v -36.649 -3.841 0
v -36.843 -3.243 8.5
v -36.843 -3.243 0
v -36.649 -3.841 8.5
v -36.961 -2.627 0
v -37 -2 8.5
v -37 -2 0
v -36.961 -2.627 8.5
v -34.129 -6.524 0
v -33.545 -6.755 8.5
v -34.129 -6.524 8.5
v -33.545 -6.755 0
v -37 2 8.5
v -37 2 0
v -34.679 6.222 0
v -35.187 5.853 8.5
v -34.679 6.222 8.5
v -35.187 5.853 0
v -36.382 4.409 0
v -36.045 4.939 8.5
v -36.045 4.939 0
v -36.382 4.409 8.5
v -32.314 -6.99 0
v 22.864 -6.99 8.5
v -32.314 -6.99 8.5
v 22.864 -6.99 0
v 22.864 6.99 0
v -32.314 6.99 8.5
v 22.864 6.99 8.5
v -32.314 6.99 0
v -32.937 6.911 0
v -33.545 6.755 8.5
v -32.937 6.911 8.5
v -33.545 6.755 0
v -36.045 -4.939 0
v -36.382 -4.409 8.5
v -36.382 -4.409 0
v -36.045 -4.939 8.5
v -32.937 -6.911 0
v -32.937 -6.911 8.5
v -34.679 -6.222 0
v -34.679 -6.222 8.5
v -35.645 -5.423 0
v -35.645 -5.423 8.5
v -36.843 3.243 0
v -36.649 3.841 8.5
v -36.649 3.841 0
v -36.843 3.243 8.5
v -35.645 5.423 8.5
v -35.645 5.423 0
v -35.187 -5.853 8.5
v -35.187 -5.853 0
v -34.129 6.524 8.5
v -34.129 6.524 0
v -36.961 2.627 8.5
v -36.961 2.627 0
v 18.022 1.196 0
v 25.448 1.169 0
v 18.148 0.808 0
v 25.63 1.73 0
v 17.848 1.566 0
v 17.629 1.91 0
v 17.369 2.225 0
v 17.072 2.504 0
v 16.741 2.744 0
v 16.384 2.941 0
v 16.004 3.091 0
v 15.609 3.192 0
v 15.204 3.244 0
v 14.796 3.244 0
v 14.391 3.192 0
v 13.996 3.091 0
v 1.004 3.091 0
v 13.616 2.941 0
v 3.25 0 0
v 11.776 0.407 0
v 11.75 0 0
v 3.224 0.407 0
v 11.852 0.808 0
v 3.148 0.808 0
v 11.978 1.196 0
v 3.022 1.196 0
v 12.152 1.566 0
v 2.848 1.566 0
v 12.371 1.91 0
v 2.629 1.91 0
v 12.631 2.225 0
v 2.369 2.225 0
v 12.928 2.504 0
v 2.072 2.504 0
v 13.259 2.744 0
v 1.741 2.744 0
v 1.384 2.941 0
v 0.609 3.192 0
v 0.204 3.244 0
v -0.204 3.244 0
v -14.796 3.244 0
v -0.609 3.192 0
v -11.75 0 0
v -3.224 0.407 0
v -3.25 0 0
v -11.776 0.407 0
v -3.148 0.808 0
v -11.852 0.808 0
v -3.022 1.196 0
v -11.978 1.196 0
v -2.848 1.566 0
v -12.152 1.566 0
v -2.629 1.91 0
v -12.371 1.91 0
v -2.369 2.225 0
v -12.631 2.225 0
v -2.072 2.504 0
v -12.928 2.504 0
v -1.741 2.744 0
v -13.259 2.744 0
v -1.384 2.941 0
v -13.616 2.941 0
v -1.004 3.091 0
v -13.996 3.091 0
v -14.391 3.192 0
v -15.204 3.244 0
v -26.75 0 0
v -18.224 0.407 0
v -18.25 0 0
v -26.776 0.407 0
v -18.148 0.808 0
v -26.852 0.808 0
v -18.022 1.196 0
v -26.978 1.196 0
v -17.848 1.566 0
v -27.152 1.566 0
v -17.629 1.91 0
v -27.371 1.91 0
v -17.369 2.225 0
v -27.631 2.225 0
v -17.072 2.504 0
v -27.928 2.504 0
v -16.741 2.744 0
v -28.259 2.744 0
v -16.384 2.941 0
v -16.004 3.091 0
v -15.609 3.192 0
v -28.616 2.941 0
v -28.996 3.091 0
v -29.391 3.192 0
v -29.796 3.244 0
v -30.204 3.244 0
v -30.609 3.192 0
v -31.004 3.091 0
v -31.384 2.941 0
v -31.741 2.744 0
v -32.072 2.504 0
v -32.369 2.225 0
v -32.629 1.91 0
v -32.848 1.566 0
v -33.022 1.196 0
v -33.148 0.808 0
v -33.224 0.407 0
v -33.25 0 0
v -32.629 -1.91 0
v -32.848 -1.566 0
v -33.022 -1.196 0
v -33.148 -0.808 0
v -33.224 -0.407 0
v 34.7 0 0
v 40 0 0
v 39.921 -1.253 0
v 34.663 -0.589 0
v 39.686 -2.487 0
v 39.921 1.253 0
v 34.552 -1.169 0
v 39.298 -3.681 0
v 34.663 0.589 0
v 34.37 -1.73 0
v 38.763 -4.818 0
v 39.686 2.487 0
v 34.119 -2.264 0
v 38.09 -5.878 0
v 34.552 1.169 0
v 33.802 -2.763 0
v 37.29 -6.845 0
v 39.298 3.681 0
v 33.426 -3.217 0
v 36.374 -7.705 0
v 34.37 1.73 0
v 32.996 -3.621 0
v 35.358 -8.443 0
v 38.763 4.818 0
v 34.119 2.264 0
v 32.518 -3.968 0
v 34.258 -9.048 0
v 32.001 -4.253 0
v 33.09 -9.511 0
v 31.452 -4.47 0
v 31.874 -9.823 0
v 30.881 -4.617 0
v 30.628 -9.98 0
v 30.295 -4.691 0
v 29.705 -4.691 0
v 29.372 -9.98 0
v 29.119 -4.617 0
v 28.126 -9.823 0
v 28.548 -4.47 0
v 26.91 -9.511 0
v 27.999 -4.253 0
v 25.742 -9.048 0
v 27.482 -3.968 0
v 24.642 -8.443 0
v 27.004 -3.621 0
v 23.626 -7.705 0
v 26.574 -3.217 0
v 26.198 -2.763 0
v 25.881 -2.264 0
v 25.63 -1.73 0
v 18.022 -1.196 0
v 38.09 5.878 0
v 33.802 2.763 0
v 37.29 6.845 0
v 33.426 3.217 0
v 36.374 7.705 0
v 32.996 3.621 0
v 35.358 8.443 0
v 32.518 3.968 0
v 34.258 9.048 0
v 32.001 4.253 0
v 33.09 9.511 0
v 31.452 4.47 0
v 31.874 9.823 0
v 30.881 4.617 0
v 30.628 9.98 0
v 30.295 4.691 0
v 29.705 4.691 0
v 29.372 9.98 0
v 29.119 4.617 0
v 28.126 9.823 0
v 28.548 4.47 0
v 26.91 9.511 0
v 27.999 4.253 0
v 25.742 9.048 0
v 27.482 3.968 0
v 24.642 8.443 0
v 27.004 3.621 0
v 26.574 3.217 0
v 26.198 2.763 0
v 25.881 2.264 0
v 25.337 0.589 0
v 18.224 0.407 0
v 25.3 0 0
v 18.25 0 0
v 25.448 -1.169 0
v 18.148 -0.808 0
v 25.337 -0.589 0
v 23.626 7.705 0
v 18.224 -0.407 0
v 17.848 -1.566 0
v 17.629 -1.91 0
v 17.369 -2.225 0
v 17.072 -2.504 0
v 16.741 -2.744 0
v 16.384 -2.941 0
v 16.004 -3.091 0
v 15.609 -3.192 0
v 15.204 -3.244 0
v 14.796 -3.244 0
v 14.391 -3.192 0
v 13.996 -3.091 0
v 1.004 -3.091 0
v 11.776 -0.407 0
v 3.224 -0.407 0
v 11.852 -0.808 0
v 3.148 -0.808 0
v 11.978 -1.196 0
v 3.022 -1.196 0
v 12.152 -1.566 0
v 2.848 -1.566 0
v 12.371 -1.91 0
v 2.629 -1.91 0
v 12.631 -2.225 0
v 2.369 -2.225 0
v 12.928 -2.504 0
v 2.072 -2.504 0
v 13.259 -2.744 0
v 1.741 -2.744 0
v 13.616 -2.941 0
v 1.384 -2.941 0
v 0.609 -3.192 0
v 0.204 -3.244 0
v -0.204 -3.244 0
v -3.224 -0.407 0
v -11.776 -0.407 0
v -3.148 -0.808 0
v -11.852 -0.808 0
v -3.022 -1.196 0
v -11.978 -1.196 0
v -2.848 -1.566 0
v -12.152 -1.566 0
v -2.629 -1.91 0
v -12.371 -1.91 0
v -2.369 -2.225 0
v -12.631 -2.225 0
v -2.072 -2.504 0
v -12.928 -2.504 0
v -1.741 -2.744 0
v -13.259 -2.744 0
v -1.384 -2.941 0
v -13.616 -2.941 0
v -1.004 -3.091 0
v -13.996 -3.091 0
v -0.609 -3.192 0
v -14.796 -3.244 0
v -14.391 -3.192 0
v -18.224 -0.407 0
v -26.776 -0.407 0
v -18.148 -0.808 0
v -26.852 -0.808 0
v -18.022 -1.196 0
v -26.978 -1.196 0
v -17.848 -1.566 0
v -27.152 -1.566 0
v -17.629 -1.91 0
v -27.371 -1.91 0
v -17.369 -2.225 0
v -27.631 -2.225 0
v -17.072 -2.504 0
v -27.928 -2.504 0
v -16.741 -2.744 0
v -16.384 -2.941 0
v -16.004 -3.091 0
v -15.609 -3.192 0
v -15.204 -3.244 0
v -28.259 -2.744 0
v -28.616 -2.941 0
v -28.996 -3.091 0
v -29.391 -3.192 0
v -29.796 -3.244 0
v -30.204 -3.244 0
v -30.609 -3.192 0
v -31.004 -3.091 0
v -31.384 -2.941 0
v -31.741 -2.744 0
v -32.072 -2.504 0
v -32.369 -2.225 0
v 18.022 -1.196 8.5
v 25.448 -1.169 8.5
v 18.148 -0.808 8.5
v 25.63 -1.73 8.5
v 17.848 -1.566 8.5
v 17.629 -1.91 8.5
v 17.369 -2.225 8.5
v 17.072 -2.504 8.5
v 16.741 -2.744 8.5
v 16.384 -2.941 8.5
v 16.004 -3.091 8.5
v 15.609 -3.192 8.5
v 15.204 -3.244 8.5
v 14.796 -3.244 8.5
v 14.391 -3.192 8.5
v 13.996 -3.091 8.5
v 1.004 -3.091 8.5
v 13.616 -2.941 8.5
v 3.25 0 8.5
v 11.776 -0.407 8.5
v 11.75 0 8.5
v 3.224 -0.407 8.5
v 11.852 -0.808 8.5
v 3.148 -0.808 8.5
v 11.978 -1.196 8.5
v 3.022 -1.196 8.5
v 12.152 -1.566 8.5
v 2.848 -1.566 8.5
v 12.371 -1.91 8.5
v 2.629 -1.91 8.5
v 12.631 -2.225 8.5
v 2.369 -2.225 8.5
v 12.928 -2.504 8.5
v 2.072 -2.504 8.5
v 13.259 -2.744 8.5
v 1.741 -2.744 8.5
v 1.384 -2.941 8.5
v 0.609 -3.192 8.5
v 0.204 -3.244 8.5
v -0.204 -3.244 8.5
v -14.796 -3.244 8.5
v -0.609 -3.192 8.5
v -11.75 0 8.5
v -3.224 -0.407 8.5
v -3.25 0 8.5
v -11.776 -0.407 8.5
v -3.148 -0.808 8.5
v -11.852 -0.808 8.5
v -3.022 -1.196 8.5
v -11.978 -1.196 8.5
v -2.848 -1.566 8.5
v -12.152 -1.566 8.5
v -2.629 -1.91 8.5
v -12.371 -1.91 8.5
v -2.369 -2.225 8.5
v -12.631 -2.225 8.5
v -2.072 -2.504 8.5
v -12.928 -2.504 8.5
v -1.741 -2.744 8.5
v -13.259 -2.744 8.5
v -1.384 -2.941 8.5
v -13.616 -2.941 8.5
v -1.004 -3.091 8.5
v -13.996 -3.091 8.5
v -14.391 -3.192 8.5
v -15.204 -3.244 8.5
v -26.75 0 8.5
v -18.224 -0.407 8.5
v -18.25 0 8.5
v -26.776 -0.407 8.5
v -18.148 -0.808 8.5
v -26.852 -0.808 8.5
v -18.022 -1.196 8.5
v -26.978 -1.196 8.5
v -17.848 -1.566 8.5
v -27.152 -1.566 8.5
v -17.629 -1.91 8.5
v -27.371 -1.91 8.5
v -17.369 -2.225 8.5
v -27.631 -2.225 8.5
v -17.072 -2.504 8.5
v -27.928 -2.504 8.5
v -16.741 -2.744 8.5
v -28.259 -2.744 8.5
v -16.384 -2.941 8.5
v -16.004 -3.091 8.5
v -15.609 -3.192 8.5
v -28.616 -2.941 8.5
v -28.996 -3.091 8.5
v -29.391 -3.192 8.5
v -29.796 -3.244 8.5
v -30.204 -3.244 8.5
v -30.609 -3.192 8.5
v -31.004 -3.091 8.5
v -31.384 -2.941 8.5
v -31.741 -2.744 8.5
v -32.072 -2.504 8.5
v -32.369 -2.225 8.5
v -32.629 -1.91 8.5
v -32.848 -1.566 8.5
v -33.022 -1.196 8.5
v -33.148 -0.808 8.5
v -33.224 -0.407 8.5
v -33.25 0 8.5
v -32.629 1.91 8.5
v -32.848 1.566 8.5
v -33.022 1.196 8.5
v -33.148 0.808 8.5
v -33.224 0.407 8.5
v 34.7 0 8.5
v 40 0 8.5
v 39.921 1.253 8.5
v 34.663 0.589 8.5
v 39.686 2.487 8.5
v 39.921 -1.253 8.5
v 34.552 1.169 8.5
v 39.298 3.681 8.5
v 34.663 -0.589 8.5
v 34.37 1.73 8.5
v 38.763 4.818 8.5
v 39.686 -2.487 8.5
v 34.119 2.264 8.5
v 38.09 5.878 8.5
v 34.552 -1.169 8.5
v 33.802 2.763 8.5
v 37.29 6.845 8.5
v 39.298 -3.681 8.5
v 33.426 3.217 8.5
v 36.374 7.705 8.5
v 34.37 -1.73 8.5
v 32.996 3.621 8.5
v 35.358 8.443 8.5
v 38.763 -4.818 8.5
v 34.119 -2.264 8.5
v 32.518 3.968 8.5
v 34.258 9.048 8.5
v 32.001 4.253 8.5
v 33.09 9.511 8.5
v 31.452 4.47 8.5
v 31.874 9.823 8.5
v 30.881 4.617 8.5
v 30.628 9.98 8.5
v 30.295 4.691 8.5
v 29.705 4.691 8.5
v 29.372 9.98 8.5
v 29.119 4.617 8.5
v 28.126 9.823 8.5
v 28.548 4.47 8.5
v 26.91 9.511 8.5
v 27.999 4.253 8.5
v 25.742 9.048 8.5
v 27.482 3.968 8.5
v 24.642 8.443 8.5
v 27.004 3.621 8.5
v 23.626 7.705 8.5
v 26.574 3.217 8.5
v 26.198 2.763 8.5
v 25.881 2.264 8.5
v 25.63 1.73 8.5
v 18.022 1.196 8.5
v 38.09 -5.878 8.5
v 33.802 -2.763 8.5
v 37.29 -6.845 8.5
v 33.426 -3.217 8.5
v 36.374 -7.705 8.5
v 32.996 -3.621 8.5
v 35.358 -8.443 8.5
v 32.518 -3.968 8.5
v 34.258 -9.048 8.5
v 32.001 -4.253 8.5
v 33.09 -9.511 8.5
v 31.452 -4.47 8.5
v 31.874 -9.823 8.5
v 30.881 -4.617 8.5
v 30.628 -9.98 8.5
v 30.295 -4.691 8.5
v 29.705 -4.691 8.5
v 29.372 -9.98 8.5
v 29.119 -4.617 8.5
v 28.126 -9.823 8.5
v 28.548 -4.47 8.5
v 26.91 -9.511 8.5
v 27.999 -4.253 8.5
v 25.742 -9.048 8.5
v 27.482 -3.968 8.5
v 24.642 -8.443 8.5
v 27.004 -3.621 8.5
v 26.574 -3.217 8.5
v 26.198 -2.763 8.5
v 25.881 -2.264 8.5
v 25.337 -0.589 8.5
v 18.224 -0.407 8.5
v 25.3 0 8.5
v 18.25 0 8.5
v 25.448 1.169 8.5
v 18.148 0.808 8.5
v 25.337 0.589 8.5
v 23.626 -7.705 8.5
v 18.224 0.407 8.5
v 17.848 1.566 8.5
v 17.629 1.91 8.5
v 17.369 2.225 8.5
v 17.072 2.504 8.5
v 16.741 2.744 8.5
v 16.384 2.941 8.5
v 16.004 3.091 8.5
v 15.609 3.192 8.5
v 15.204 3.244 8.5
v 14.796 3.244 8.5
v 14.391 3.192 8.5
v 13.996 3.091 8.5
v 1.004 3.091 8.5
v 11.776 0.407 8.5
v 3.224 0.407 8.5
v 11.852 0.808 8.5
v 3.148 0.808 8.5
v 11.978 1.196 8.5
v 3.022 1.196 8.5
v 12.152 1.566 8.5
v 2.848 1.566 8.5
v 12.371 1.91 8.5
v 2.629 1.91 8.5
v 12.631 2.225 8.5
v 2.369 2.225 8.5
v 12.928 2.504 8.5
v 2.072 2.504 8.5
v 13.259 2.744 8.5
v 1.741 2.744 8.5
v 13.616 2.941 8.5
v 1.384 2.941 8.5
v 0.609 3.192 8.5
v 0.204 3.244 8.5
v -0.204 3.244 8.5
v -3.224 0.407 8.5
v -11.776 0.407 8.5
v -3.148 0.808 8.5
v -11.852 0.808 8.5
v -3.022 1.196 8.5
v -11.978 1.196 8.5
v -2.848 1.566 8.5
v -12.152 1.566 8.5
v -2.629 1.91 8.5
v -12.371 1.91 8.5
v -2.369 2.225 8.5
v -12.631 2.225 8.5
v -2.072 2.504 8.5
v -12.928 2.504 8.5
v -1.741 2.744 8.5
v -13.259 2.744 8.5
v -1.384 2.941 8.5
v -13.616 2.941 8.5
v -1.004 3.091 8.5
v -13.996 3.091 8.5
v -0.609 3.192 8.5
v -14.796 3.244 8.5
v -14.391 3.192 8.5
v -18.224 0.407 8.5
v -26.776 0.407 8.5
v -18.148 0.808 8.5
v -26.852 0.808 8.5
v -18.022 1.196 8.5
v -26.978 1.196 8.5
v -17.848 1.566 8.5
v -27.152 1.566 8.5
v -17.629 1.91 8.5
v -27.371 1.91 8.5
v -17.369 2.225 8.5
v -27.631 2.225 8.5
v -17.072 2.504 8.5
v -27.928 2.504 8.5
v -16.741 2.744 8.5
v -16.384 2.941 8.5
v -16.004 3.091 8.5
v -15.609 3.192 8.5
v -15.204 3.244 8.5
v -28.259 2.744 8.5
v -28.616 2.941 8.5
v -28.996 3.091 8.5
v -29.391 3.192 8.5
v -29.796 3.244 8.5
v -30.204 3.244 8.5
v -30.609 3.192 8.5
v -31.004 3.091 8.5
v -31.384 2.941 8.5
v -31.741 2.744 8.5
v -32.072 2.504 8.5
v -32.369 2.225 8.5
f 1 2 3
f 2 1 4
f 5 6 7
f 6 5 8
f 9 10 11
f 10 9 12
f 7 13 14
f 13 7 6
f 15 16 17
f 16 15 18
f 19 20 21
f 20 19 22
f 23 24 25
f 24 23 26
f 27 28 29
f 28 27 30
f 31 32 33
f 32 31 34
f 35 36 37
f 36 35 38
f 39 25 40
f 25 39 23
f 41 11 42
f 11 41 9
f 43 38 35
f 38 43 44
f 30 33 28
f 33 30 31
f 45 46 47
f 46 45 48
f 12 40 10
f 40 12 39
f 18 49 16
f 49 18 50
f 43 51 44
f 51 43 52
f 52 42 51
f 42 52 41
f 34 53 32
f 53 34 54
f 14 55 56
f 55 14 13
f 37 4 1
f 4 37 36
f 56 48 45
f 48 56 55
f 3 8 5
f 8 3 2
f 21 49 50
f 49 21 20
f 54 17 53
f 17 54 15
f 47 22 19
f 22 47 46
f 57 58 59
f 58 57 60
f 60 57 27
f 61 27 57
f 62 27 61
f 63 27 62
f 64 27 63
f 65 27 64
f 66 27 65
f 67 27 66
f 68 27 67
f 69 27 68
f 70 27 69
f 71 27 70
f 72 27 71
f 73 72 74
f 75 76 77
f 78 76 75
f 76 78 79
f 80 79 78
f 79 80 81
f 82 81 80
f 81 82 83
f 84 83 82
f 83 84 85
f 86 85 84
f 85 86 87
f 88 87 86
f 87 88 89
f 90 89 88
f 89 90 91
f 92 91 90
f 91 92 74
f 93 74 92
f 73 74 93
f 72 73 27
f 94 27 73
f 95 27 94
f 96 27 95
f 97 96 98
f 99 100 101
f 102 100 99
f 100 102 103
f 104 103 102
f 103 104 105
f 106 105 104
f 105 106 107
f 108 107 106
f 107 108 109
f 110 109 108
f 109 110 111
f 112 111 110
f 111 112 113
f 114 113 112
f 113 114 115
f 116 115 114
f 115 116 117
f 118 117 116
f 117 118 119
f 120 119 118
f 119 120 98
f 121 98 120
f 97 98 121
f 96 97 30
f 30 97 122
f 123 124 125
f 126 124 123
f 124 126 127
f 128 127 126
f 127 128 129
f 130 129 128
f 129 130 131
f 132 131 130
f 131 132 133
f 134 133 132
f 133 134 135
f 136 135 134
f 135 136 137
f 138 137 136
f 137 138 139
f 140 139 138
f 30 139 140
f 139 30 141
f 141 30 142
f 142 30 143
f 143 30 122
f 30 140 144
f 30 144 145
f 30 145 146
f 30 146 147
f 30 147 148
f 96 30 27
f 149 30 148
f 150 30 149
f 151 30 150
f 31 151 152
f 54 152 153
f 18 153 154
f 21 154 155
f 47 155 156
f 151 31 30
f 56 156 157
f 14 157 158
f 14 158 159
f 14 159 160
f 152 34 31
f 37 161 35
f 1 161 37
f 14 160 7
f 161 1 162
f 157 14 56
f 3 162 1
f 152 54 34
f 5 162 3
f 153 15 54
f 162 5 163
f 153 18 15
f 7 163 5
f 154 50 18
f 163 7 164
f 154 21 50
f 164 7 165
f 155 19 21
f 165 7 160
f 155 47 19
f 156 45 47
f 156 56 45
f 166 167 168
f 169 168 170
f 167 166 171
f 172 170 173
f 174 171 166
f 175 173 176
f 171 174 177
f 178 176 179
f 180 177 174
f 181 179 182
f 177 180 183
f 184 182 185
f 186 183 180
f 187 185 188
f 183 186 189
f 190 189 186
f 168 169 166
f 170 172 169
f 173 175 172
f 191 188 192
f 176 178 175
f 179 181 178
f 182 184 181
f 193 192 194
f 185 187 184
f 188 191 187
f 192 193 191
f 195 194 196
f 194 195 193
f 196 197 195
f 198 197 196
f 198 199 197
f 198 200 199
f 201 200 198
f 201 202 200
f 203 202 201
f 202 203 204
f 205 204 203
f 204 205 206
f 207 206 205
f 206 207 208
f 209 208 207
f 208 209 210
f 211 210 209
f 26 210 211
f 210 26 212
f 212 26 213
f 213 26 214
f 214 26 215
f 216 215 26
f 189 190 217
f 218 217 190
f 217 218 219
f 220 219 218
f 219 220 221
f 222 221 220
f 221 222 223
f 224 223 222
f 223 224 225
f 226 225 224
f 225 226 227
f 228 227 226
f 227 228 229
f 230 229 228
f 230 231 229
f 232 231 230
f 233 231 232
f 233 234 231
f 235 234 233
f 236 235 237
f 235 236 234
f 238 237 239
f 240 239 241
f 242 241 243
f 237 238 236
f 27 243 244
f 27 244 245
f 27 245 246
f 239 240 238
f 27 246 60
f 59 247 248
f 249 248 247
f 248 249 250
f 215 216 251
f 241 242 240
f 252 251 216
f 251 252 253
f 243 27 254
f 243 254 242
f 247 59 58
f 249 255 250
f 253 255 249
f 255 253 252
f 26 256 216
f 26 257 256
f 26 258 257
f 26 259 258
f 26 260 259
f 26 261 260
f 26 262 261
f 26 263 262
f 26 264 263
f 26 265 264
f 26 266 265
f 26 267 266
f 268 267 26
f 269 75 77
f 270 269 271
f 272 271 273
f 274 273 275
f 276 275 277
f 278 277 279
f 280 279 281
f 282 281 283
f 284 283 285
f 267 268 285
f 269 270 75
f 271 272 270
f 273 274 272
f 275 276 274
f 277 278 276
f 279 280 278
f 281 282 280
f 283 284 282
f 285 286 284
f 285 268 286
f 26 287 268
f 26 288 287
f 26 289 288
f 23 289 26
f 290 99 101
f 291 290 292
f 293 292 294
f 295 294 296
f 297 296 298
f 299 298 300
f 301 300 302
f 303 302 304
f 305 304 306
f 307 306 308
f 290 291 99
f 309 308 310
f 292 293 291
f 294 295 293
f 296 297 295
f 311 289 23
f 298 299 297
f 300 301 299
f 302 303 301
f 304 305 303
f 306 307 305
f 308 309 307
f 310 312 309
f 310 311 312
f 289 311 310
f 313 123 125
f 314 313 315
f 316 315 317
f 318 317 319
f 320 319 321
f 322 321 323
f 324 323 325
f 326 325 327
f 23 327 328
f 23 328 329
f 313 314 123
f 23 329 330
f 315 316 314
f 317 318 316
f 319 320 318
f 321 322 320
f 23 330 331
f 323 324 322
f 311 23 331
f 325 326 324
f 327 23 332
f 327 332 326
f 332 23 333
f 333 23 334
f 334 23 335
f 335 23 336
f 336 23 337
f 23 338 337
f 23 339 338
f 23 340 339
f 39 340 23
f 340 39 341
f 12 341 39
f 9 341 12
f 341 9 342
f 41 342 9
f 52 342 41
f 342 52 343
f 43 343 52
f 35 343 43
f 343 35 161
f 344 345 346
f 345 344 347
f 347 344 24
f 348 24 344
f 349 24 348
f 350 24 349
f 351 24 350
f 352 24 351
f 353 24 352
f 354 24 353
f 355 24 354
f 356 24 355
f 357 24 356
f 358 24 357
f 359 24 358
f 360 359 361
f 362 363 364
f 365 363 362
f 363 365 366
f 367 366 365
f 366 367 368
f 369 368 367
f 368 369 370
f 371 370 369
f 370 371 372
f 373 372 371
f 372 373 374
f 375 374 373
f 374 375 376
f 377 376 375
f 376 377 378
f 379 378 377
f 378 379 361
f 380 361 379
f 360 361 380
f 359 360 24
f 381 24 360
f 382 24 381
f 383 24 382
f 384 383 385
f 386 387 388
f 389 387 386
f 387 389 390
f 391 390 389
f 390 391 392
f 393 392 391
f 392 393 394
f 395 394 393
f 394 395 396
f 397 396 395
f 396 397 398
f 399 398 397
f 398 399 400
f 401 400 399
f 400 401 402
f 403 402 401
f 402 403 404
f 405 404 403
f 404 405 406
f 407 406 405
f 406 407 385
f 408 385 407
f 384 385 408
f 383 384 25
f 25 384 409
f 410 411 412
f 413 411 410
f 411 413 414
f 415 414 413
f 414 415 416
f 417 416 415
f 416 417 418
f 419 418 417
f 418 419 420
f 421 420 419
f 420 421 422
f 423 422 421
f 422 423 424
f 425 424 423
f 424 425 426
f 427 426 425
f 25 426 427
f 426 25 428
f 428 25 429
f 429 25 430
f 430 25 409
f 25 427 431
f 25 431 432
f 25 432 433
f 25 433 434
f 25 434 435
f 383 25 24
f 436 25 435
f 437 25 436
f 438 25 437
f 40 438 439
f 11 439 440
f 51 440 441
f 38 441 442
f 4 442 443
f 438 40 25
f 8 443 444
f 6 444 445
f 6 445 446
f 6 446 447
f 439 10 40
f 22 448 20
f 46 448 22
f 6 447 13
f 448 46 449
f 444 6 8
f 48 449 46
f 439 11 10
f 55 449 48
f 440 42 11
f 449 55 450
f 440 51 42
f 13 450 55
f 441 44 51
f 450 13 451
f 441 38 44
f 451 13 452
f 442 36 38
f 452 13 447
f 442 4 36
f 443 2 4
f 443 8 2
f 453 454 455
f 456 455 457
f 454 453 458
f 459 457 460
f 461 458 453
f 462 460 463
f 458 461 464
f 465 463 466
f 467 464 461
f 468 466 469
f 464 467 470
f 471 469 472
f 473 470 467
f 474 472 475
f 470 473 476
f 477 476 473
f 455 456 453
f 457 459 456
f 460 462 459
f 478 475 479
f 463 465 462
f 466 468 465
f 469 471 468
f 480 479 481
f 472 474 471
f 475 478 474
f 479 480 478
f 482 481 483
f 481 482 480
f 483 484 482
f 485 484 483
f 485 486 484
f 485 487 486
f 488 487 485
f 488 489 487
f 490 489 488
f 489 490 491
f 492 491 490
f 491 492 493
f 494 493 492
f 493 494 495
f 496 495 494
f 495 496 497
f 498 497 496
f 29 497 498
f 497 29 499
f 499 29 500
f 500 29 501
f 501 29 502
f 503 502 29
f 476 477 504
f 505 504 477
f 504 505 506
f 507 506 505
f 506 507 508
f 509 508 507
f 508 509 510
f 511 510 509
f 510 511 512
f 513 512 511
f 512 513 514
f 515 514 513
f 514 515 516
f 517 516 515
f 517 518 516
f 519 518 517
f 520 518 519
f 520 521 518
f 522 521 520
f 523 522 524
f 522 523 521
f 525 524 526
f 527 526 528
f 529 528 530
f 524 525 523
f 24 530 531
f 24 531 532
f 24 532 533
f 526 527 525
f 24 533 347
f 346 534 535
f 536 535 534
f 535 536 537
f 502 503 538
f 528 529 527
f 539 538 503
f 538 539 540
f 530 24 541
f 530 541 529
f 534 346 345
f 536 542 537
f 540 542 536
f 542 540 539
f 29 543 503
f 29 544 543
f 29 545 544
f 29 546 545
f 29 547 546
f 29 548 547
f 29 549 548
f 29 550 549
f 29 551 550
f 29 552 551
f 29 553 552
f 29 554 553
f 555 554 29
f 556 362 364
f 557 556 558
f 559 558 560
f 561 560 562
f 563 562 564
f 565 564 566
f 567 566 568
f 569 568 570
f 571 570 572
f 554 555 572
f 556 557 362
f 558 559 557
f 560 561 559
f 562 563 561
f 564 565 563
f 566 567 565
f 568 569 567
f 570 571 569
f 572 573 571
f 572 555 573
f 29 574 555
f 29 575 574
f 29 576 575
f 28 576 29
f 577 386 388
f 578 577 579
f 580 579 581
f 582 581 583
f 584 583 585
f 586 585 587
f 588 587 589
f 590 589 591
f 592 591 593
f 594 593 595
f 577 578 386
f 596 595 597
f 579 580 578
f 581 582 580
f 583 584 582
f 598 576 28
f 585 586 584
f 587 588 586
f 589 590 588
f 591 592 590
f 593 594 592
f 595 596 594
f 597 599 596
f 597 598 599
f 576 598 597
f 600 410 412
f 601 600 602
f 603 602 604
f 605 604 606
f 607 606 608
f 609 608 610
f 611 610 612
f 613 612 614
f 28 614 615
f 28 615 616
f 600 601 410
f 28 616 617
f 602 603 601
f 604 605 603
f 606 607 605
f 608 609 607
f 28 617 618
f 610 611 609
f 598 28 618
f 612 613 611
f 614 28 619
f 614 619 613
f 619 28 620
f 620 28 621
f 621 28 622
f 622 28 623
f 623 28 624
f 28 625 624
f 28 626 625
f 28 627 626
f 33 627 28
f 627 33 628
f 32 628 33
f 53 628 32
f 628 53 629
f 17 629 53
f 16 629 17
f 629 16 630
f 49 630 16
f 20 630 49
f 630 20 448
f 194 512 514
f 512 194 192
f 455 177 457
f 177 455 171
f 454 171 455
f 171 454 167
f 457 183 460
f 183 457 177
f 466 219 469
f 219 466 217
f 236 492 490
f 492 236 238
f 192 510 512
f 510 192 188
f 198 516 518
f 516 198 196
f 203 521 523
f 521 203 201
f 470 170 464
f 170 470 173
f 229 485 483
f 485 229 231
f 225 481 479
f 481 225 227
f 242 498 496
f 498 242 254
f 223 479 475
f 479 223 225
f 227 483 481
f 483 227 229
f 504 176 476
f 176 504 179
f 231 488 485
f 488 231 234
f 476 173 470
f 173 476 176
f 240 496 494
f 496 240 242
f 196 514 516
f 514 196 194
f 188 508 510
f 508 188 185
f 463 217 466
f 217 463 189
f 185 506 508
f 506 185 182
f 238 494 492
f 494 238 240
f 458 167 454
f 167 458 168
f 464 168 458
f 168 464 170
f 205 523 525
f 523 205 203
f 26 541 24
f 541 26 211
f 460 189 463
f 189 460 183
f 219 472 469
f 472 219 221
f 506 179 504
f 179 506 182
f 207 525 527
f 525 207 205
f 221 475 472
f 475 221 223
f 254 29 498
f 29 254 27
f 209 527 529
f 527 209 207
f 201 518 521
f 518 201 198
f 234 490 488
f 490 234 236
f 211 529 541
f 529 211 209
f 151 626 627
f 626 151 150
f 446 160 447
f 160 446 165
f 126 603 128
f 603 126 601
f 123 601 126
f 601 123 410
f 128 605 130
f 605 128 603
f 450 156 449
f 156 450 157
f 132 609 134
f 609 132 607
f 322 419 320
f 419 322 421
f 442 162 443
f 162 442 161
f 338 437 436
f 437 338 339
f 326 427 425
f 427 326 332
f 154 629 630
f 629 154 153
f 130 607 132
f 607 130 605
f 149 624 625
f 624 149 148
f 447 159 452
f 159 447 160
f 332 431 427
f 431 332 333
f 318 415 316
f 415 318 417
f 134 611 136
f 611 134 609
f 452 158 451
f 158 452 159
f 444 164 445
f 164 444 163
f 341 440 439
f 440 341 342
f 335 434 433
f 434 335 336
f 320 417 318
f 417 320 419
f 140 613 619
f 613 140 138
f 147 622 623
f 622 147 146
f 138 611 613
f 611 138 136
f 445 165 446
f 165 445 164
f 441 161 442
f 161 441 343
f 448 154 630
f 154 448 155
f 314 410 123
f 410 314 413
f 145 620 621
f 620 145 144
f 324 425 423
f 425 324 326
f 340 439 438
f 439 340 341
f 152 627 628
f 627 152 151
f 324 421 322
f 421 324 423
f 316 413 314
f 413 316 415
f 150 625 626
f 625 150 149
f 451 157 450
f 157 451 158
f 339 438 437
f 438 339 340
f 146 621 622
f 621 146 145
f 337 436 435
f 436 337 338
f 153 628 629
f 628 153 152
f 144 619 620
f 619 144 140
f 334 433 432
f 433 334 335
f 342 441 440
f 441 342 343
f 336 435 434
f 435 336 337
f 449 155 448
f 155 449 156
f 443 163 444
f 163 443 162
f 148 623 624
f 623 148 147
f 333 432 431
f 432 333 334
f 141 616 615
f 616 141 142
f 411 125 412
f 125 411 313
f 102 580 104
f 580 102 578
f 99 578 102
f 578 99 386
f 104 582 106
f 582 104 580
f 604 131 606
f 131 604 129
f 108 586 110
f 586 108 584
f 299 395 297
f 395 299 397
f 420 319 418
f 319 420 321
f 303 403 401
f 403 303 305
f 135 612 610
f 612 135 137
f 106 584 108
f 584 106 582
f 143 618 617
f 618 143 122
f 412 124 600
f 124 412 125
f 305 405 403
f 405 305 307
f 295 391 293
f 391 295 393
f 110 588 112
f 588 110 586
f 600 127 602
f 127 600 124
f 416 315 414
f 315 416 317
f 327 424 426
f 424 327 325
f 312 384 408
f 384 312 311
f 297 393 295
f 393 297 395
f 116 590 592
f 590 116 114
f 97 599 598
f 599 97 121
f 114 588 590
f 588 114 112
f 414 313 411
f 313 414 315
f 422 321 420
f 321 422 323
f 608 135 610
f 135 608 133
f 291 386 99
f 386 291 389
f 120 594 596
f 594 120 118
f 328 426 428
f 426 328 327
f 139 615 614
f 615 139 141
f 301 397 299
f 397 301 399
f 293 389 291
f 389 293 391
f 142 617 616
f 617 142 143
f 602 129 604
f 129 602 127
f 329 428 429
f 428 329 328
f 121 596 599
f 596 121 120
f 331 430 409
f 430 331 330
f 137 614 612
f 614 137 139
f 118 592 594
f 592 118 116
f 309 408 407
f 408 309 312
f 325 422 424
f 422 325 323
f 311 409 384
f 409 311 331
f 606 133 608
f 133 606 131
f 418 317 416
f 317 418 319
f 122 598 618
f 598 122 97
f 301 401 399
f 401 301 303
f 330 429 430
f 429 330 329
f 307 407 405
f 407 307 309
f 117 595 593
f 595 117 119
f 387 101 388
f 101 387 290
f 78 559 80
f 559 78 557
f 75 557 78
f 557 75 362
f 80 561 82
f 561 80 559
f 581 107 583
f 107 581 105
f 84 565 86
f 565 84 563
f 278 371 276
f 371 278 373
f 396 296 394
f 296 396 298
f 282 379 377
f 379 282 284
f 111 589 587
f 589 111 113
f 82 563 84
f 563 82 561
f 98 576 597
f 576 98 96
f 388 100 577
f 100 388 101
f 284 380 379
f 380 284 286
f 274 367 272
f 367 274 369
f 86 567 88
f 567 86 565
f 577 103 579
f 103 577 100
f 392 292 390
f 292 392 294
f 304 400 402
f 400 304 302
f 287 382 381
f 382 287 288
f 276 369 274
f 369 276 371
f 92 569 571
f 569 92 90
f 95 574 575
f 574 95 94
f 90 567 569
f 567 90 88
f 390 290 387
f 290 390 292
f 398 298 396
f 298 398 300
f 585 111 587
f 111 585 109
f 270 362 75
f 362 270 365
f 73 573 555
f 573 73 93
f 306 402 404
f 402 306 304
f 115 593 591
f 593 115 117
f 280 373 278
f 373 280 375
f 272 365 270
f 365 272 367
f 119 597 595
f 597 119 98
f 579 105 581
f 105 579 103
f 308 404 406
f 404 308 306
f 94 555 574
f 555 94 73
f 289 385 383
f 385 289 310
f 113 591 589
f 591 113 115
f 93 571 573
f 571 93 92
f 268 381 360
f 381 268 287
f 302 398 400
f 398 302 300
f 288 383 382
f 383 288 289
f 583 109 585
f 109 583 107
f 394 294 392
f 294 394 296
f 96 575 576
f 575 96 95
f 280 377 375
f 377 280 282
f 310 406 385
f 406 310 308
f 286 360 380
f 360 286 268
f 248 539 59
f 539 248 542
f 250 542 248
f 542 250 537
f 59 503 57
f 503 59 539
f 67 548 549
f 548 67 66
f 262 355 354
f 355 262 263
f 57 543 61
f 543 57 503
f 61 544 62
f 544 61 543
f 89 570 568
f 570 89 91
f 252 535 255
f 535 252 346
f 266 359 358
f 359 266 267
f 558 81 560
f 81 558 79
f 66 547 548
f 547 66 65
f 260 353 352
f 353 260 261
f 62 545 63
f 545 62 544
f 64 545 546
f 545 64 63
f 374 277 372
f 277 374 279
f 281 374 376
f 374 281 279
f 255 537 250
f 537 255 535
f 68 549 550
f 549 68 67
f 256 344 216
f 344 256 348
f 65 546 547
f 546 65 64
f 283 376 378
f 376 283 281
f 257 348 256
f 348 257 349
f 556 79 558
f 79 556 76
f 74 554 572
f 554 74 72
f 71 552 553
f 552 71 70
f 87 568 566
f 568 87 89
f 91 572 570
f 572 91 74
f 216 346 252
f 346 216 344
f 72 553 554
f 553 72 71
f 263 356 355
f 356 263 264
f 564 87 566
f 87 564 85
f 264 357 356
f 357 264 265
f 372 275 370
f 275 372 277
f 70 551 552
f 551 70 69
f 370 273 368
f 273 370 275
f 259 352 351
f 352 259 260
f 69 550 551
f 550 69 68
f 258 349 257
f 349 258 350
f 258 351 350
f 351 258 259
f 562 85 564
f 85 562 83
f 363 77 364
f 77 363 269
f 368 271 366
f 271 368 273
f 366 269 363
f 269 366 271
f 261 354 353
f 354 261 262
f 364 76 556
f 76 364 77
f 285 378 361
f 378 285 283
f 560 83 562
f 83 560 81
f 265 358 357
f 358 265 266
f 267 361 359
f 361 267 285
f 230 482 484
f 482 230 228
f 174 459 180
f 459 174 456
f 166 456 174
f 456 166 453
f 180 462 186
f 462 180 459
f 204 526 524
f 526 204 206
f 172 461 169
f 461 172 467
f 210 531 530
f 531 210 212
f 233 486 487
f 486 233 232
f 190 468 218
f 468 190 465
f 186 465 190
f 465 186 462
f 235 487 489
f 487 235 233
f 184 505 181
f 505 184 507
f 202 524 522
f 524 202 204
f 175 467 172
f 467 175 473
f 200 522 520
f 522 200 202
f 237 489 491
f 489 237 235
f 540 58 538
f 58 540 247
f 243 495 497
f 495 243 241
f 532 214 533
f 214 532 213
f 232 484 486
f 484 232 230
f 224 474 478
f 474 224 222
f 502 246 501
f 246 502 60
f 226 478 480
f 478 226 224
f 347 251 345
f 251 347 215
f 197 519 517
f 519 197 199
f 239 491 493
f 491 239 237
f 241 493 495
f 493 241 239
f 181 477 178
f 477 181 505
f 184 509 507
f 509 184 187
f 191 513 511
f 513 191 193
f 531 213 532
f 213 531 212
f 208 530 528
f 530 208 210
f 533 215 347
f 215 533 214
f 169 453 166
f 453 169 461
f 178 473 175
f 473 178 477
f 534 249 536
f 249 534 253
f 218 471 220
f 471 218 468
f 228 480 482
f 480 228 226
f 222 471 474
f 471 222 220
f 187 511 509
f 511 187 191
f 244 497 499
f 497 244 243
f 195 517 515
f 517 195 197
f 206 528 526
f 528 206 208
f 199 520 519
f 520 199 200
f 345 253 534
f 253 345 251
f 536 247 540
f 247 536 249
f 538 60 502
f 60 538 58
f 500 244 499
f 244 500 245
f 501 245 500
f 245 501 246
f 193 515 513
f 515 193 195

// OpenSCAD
$fn = 50;


difference() {
	union() {
		*color(alpha = 1.0000000000, c = "gray") {
			translate(v = [0, 7, 0]) {
				linear_extrude(height = 1) {
					text(font = "Arial:style=Bold", halign = "center", size = 4.5000000000, text = "COMMENT plate main", valign = "center");
				}
			}
		}
		*color(alpha = 1.0000000000, c = "gray") {
			translate(v = [0, 14, 0]) {
				linear_extrude(height = 1) {
					text(font = "Arial:style=Bold", halign = "center", size = 4.5000000000, text = "COMMENT description oobb_plate_shape_p_type_8.5_depth_5_width_1_height_8.5_thickness_slip_end_extra", valign = "center");
				}
			}
		}
		hull() {
			translate(v = [-32.0000000000, 2.0000000000, 0]) {
				cylinder(h = 8.5000000000, r = 5);
			}
			translate(v = [32.0000000000, 2.0000000000, 0]) {
				cylinder(h = 8.5000000000, r = 5);
			}
			translate(v = [-32.0000000000, -2.0000000000, 0]) {
				cylinder(h = 8.5000000000, r = 5);
			}
			translate(v = [32.0000000000, -2.0000000000, 0]) {
				cylinder(h = 8.5000000000, r = 5);
			}
		}
		translate(v = [30.0000000000, 0, 0.0000000000]) {
			cylinder(h = 8.5000000000, r = 10.0000000000);
		}
	}
	union() {
		*color(alpha = 1.0000000000, c = "gray") {
			translate(v = [0, 7, 0]) {
				linear_extrude(height = 1) {
					text(font = "Arial:style=Bold", halign = "center", size = 4.5000000000, text = "COMMENT holes main", valign = "center");
				}
			}
		}
		*color(alpha = 1.0000000000, c = "gray") {
			translate(v = [0, 14, 0]) {
				linear_extrude(height = 1) {
					text(font = "Arial:style=Bold", halign = "center", size = 4.5000000000, text = "COMMENT description oobb_holes_shape_n_type_5_width_1_height_8.5_thickness_slip_end_extra_false_both_holes", valign = "center");
				}
			}
		}
		translate(v = [-30.0000000000, 0.0000000000, 0]) {
			translate(v = [0, 0, -50]) {
				cylinder(h = 100, r = 3.2500000000);
			}
		}
		translate(v = [-15.0000000000, 0.0000000000, 0]) {
			translate(v = [0, 0, -50]) {
				cylinder(h = 100, r = 3.2500000000);
			}
		}
		translate(v = [0, 0, -50]) {
			cylinder(h = 100, r = 3.2500000000);
		}
		translate(v = [15.0000000000, 0.0000000000, 0]) {
			translate(v = [0, 0, -50]) {
				cylinder(h = 100, r = 3.2500000000);
			}
		}
		translate(v = [30.0000000000, 0.0000000000, 0]) {
			translate(v = [0, 0, -50]) {
				cylinder(h = 100, r = 3.2500000000);
			}
		}
		*color(alpha = 1.0000000000, c = "gray") {
			translate(v = [0, 7, 0]) {
				linear_extrude(height = 1) {
					text(font = "Arial:style=Bold", halign = "center", size = 4.5000000000, text = "COMMENT slip_end", valign = "center");
				}
			}
		}
		translate(v = [30.0000000000, 0, -50.0000000000]) {
			cylinder(h = 100, r = 4.7000000000);
		}
	}
}
